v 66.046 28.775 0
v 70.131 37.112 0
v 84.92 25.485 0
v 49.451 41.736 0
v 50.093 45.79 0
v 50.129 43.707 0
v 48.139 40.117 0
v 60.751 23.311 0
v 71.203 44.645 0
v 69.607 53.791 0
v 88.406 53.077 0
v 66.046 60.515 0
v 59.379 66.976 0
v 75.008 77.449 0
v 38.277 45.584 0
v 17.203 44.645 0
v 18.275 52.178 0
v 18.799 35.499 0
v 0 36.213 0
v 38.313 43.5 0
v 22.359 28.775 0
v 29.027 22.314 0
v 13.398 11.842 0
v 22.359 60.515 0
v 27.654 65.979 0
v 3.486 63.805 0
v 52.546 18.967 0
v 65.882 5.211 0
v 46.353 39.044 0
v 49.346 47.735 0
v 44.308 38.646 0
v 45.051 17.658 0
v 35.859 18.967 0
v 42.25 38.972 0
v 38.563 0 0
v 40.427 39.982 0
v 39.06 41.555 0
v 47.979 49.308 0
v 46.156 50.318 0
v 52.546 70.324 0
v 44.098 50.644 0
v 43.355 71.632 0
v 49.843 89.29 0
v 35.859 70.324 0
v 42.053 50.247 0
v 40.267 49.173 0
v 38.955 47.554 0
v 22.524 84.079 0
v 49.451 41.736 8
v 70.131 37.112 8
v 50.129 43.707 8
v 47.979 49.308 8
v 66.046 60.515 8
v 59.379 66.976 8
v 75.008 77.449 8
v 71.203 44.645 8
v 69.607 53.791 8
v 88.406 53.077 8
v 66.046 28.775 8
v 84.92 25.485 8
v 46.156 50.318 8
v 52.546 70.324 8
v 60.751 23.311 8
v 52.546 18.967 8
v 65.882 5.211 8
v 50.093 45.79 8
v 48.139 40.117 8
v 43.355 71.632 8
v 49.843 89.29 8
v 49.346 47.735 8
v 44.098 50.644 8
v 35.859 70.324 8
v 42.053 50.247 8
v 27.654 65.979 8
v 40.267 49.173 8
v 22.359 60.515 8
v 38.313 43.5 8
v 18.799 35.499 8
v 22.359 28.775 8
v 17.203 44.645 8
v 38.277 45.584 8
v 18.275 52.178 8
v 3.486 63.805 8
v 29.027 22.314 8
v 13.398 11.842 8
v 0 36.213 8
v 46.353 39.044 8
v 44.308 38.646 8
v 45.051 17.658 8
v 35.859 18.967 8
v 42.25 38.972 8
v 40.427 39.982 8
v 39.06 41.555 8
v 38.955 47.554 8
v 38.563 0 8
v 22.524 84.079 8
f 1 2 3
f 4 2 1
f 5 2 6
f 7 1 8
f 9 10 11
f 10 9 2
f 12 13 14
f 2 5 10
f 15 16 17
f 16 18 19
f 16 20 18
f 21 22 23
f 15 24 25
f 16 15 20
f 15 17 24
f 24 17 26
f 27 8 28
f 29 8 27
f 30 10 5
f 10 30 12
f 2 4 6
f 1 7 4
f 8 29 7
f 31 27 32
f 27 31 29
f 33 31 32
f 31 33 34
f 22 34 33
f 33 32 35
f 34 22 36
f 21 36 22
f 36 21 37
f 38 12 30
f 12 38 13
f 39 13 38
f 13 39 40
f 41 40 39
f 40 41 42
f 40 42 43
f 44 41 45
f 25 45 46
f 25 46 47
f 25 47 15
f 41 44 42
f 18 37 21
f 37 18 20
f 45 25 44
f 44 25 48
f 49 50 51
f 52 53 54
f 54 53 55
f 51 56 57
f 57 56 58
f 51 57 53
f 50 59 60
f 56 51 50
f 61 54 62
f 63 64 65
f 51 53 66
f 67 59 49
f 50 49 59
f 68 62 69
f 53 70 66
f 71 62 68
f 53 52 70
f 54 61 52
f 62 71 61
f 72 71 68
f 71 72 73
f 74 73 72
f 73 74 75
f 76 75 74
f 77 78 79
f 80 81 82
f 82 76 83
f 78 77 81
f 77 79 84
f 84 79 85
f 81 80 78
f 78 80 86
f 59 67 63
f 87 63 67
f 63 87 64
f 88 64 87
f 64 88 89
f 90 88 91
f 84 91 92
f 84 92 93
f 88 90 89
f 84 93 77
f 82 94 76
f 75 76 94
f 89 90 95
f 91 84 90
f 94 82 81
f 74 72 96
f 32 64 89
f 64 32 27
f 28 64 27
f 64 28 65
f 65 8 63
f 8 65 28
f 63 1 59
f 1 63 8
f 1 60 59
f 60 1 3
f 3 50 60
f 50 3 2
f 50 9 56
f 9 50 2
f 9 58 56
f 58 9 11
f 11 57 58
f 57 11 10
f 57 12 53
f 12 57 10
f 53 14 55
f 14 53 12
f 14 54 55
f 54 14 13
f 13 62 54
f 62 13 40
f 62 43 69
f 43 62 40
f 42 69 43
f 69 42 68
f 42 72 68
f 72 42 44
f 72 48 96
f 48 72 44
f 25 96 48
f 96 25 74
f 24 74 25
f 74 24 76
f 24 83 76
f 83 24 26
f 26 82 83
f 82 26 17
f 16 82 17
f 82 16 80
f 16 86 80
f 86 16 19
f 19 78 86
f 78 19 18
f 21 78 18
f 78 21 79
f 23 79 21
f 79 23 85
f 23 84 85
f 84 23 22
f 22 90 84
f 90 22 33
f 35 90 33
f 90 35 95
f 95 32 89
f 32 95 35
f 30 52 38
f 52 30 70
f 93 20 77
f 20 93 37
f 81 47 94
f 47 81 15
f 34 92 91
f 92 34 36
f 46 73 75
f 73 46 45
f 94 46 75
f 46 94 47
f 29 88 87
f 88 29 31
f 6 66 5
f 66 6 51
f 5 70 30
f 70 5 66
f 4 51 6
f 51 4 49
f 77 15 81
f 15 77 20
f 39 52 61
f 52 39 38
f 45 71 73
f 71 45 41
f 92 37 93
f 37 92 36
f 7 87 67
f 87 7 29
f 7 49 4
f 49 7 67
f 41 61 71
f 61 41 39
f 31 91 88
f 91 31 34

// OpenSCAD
$fn = 32;

// ----------------------------------------------------------------------
// Star wheel: 10-point ratchet, R45
// ----------------------------------------------------------------------

// --- parameters (mm) ---
n_points = 10;            // number of points / teeth
r_out = 45;               // tip radius
r_in = 27;                // root radius
bore_r = 6;               // centre bore radius
plate_t = 8;              // plate thickness, Z (extrusion height)
bore_d = 12;              // centre bore diameter

profile = [[17.203, 44.645], [0, 36.213], [18.799, 35.499], [22.359, 28.775], [13.398, 11.842], [29.027, 22.314], [35.859, 18.967], [38.563, 0], [45.051, 17.658], [52.546, 18.967], [65.882, 5.211], [60.751, 23.311], [66.046, 28.775], [84.92, 25.485], [70.131, 37.112], [71.203, 44.645], [88.406, 53.077], [69.607, 53.791], [66.046, 60.515], [75.008, 77.449], [59.379, 66.976], [52.546, 70.324], [49.843, 89.29], [43.355, 71.632], [35.859, 70.324], [22.524, 84.079], [27.654, 65.979], [22.359, 60.515], [3.486, 63.805], [18.275, 52.178]];  // primary outline, 30 points, counter clockwise
void_1 = [[50.093, 45.79], [49.346, 47.735], [47.979, 49.308], [46.156, 50.318], [44.098, 50.644], [42.053, 50.247], [40.267, 49.173], [38.955, 47.554], [38.277, 45.584], [38.313, 43.5], [39.06, 41.555], [40.427, 39.982], [42.25, 38.972], [44.308, 38.646], [46.353, 39.044], [48.139, 40.117], [49.451, 41.736], [50.129, 43.707]];  // centre bore, 18 points

// --- the one profile operation ---
difference() {
  linear_extrude(height = plate_t) polygon(points = profile);
  translate([0, 0, -1])
    linear_extrude(height = plate_t + 2) polygon(points = void_1);
}
